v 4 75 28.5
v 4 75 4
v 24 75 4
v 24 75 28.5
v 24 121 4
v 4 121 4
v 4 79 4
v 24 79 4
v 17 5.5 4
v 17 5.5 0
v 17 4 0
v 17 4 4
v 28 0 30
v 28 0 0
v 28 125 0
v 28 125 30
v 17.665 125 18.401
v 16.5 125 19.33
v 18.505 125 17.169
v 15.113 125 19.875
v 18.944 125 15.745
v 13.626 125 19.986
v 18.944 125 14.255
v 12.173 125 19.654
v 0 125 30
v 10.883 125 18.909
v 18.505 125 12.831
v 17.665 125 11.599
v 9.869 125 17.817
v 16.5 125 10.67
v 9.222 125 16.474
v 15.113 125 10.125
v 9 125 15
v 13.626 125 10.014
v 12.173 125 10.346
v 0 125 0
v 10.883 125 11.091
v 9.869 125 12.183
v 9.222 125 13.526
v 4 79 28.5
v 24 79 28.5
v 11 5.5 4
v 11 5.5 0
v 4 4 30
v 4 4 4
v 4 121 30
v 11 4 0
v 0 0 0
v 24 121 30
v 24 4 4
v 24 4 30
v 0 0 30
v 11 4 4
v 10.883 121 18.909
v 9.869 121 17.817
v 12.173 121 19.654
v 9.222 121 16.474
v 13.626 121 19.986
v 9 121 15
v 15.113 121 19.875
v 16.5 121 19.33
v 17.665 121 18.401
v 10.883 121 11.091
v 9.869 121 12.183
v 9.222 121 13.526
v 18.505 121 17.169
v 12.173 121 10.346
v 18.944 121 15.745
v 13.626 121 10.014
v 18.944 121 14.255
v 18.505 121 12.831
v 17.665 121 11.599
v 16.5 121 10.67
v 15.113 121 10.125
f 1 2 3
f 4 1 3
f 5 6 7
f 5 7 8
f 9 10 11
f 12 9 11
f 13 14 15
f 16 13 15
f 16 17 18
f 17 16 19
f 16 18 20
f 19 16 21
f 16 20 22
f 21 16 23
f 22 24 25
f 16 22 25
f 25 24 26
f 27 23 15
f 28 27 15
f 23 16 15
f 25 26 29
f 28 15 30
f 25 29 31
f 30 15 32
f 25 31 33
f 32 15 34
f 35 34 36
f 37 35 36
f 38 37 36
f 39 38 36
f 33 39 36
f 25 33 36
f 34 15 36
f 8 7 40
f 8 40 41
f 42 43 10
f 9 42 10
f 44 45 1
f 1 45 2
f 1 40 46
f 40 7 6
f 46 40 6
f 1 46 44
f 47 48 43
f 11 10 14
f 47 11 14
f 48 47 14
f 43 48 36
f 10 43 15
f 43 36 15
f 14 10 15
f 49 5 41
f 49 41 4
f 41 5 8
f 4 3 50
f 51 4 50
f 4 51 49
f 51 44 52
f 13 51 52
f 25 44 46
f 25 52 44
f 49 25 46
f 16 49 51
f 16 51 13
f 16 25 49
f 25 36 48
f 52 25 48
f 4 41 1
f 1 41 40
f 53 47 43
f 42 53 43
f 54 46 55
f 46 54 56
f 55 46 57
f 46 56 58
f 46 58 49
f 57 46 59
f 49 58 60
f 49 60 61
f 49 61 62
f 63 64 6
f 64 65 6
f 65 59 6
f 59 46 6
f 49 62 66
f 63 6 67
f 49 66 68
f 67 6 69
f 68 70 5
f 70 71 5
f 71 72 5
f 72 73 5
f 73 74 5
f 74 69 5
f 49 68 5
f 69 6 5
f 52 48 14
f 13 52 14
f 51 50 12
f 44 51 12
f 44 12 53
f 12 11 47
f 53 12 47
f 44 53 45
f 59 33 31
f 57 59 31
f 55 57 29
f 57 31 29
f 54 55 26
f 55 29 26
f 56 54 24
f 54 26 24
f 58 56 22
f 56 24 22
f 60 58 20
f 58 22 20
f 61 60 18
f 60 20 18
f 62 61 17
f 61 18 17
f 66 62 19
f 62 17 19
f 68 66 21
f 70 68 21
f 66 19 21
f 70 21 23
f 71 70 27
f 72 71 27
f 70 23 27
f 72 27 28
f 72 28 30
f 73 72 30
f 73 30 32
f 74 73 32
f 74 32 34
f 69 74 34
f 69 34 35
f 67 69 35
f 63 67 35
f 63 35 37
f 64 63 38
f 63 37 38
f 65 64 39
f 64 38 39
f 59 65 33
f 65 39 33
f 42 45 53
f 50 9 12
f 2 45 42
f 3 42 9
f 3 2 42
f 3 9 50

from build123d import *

# Parameters (mm, degrees)
F1_DEPTH = 4
F0_W     = 28
F0_H     = 79
F2_DEPTH = 30
F3_W     = 10
F3_H     = 1.5
F4_DEPTH = 4
F6_DEPTH = 30
F5_W     = 20
F5_H     = 42
F7_DEPTH = 4
F8_R     = 5
F9_DEPTH = 4


with BuildPart() as f1:
    # F0 (on Top) → F1 (new body)
    with BuildSketch(Plane.XY):
        Polygon((17, 4), (24, 4), (24, 75), (4, 75), (4, 4), (11, 4), (11, 5.5), (14, 5.5), (17, 5.5), align=None)
    extrude(amount=F1_DEPTH)

    # F0 (on Top) → F2 (join)
    with BuildSketch(Plane.XY):
        with Locations((14, 39.5)):
            Rectangle(F0_W, F0_H)
        Polygon((24, 75), (24, 4), (17, 4), (14, 4), (11, 4), (4, 4), (4, 75), align=None, mode=Mode.SUBTRACT)
    extrude(amount=F2_DEPTH)

    # F3 (on face) → F4 (cut, through all)
    with BuildSketch(Plane(origin=(0, 79, 0), x_dir=(-1, 0, 0), z_dir=(0, 1, 0))):
        with Locations((-9, 29.25)):
            Rectangle(F3_W, F3_H)
        with Locations((-19, 29.25)):
            Rectangle(F3_W, F3_H)
    extrude(amount=-F4_DEPTH, mode=Mode.SUBTRACT)

    # F5 (on Top) → F6 (join)
    with BuildSketch(Plane.XY):
        Polygon((24, 79), (28, 79), (28, 125), (0, 125), (0, 79), (4, 79), (4, 121), (24, 121), align=None)
    extrude(amount=F6_DEPTH)

    # F5 (on Top) → F7 (join)
    with BuildSketch(Plane.XY):
        with Locations((14, 100)):
            Rectangle(F5_W, F5_H)
    extrude(amount=F7_DEPTH)

    # F8 (on face) → F9 (cut, through all)
    with BuildSketch(Plane(origin=(0, 125, 0), x_dir=(-1, 0, 0), z_dir=(0, 1, 0))):
        with Locations((-14, 15)):
            Circle(F8_R)
    extrude(amount=-F9_DEPTH, mode=Mode.SUBTRACT)


solid = f1.part
